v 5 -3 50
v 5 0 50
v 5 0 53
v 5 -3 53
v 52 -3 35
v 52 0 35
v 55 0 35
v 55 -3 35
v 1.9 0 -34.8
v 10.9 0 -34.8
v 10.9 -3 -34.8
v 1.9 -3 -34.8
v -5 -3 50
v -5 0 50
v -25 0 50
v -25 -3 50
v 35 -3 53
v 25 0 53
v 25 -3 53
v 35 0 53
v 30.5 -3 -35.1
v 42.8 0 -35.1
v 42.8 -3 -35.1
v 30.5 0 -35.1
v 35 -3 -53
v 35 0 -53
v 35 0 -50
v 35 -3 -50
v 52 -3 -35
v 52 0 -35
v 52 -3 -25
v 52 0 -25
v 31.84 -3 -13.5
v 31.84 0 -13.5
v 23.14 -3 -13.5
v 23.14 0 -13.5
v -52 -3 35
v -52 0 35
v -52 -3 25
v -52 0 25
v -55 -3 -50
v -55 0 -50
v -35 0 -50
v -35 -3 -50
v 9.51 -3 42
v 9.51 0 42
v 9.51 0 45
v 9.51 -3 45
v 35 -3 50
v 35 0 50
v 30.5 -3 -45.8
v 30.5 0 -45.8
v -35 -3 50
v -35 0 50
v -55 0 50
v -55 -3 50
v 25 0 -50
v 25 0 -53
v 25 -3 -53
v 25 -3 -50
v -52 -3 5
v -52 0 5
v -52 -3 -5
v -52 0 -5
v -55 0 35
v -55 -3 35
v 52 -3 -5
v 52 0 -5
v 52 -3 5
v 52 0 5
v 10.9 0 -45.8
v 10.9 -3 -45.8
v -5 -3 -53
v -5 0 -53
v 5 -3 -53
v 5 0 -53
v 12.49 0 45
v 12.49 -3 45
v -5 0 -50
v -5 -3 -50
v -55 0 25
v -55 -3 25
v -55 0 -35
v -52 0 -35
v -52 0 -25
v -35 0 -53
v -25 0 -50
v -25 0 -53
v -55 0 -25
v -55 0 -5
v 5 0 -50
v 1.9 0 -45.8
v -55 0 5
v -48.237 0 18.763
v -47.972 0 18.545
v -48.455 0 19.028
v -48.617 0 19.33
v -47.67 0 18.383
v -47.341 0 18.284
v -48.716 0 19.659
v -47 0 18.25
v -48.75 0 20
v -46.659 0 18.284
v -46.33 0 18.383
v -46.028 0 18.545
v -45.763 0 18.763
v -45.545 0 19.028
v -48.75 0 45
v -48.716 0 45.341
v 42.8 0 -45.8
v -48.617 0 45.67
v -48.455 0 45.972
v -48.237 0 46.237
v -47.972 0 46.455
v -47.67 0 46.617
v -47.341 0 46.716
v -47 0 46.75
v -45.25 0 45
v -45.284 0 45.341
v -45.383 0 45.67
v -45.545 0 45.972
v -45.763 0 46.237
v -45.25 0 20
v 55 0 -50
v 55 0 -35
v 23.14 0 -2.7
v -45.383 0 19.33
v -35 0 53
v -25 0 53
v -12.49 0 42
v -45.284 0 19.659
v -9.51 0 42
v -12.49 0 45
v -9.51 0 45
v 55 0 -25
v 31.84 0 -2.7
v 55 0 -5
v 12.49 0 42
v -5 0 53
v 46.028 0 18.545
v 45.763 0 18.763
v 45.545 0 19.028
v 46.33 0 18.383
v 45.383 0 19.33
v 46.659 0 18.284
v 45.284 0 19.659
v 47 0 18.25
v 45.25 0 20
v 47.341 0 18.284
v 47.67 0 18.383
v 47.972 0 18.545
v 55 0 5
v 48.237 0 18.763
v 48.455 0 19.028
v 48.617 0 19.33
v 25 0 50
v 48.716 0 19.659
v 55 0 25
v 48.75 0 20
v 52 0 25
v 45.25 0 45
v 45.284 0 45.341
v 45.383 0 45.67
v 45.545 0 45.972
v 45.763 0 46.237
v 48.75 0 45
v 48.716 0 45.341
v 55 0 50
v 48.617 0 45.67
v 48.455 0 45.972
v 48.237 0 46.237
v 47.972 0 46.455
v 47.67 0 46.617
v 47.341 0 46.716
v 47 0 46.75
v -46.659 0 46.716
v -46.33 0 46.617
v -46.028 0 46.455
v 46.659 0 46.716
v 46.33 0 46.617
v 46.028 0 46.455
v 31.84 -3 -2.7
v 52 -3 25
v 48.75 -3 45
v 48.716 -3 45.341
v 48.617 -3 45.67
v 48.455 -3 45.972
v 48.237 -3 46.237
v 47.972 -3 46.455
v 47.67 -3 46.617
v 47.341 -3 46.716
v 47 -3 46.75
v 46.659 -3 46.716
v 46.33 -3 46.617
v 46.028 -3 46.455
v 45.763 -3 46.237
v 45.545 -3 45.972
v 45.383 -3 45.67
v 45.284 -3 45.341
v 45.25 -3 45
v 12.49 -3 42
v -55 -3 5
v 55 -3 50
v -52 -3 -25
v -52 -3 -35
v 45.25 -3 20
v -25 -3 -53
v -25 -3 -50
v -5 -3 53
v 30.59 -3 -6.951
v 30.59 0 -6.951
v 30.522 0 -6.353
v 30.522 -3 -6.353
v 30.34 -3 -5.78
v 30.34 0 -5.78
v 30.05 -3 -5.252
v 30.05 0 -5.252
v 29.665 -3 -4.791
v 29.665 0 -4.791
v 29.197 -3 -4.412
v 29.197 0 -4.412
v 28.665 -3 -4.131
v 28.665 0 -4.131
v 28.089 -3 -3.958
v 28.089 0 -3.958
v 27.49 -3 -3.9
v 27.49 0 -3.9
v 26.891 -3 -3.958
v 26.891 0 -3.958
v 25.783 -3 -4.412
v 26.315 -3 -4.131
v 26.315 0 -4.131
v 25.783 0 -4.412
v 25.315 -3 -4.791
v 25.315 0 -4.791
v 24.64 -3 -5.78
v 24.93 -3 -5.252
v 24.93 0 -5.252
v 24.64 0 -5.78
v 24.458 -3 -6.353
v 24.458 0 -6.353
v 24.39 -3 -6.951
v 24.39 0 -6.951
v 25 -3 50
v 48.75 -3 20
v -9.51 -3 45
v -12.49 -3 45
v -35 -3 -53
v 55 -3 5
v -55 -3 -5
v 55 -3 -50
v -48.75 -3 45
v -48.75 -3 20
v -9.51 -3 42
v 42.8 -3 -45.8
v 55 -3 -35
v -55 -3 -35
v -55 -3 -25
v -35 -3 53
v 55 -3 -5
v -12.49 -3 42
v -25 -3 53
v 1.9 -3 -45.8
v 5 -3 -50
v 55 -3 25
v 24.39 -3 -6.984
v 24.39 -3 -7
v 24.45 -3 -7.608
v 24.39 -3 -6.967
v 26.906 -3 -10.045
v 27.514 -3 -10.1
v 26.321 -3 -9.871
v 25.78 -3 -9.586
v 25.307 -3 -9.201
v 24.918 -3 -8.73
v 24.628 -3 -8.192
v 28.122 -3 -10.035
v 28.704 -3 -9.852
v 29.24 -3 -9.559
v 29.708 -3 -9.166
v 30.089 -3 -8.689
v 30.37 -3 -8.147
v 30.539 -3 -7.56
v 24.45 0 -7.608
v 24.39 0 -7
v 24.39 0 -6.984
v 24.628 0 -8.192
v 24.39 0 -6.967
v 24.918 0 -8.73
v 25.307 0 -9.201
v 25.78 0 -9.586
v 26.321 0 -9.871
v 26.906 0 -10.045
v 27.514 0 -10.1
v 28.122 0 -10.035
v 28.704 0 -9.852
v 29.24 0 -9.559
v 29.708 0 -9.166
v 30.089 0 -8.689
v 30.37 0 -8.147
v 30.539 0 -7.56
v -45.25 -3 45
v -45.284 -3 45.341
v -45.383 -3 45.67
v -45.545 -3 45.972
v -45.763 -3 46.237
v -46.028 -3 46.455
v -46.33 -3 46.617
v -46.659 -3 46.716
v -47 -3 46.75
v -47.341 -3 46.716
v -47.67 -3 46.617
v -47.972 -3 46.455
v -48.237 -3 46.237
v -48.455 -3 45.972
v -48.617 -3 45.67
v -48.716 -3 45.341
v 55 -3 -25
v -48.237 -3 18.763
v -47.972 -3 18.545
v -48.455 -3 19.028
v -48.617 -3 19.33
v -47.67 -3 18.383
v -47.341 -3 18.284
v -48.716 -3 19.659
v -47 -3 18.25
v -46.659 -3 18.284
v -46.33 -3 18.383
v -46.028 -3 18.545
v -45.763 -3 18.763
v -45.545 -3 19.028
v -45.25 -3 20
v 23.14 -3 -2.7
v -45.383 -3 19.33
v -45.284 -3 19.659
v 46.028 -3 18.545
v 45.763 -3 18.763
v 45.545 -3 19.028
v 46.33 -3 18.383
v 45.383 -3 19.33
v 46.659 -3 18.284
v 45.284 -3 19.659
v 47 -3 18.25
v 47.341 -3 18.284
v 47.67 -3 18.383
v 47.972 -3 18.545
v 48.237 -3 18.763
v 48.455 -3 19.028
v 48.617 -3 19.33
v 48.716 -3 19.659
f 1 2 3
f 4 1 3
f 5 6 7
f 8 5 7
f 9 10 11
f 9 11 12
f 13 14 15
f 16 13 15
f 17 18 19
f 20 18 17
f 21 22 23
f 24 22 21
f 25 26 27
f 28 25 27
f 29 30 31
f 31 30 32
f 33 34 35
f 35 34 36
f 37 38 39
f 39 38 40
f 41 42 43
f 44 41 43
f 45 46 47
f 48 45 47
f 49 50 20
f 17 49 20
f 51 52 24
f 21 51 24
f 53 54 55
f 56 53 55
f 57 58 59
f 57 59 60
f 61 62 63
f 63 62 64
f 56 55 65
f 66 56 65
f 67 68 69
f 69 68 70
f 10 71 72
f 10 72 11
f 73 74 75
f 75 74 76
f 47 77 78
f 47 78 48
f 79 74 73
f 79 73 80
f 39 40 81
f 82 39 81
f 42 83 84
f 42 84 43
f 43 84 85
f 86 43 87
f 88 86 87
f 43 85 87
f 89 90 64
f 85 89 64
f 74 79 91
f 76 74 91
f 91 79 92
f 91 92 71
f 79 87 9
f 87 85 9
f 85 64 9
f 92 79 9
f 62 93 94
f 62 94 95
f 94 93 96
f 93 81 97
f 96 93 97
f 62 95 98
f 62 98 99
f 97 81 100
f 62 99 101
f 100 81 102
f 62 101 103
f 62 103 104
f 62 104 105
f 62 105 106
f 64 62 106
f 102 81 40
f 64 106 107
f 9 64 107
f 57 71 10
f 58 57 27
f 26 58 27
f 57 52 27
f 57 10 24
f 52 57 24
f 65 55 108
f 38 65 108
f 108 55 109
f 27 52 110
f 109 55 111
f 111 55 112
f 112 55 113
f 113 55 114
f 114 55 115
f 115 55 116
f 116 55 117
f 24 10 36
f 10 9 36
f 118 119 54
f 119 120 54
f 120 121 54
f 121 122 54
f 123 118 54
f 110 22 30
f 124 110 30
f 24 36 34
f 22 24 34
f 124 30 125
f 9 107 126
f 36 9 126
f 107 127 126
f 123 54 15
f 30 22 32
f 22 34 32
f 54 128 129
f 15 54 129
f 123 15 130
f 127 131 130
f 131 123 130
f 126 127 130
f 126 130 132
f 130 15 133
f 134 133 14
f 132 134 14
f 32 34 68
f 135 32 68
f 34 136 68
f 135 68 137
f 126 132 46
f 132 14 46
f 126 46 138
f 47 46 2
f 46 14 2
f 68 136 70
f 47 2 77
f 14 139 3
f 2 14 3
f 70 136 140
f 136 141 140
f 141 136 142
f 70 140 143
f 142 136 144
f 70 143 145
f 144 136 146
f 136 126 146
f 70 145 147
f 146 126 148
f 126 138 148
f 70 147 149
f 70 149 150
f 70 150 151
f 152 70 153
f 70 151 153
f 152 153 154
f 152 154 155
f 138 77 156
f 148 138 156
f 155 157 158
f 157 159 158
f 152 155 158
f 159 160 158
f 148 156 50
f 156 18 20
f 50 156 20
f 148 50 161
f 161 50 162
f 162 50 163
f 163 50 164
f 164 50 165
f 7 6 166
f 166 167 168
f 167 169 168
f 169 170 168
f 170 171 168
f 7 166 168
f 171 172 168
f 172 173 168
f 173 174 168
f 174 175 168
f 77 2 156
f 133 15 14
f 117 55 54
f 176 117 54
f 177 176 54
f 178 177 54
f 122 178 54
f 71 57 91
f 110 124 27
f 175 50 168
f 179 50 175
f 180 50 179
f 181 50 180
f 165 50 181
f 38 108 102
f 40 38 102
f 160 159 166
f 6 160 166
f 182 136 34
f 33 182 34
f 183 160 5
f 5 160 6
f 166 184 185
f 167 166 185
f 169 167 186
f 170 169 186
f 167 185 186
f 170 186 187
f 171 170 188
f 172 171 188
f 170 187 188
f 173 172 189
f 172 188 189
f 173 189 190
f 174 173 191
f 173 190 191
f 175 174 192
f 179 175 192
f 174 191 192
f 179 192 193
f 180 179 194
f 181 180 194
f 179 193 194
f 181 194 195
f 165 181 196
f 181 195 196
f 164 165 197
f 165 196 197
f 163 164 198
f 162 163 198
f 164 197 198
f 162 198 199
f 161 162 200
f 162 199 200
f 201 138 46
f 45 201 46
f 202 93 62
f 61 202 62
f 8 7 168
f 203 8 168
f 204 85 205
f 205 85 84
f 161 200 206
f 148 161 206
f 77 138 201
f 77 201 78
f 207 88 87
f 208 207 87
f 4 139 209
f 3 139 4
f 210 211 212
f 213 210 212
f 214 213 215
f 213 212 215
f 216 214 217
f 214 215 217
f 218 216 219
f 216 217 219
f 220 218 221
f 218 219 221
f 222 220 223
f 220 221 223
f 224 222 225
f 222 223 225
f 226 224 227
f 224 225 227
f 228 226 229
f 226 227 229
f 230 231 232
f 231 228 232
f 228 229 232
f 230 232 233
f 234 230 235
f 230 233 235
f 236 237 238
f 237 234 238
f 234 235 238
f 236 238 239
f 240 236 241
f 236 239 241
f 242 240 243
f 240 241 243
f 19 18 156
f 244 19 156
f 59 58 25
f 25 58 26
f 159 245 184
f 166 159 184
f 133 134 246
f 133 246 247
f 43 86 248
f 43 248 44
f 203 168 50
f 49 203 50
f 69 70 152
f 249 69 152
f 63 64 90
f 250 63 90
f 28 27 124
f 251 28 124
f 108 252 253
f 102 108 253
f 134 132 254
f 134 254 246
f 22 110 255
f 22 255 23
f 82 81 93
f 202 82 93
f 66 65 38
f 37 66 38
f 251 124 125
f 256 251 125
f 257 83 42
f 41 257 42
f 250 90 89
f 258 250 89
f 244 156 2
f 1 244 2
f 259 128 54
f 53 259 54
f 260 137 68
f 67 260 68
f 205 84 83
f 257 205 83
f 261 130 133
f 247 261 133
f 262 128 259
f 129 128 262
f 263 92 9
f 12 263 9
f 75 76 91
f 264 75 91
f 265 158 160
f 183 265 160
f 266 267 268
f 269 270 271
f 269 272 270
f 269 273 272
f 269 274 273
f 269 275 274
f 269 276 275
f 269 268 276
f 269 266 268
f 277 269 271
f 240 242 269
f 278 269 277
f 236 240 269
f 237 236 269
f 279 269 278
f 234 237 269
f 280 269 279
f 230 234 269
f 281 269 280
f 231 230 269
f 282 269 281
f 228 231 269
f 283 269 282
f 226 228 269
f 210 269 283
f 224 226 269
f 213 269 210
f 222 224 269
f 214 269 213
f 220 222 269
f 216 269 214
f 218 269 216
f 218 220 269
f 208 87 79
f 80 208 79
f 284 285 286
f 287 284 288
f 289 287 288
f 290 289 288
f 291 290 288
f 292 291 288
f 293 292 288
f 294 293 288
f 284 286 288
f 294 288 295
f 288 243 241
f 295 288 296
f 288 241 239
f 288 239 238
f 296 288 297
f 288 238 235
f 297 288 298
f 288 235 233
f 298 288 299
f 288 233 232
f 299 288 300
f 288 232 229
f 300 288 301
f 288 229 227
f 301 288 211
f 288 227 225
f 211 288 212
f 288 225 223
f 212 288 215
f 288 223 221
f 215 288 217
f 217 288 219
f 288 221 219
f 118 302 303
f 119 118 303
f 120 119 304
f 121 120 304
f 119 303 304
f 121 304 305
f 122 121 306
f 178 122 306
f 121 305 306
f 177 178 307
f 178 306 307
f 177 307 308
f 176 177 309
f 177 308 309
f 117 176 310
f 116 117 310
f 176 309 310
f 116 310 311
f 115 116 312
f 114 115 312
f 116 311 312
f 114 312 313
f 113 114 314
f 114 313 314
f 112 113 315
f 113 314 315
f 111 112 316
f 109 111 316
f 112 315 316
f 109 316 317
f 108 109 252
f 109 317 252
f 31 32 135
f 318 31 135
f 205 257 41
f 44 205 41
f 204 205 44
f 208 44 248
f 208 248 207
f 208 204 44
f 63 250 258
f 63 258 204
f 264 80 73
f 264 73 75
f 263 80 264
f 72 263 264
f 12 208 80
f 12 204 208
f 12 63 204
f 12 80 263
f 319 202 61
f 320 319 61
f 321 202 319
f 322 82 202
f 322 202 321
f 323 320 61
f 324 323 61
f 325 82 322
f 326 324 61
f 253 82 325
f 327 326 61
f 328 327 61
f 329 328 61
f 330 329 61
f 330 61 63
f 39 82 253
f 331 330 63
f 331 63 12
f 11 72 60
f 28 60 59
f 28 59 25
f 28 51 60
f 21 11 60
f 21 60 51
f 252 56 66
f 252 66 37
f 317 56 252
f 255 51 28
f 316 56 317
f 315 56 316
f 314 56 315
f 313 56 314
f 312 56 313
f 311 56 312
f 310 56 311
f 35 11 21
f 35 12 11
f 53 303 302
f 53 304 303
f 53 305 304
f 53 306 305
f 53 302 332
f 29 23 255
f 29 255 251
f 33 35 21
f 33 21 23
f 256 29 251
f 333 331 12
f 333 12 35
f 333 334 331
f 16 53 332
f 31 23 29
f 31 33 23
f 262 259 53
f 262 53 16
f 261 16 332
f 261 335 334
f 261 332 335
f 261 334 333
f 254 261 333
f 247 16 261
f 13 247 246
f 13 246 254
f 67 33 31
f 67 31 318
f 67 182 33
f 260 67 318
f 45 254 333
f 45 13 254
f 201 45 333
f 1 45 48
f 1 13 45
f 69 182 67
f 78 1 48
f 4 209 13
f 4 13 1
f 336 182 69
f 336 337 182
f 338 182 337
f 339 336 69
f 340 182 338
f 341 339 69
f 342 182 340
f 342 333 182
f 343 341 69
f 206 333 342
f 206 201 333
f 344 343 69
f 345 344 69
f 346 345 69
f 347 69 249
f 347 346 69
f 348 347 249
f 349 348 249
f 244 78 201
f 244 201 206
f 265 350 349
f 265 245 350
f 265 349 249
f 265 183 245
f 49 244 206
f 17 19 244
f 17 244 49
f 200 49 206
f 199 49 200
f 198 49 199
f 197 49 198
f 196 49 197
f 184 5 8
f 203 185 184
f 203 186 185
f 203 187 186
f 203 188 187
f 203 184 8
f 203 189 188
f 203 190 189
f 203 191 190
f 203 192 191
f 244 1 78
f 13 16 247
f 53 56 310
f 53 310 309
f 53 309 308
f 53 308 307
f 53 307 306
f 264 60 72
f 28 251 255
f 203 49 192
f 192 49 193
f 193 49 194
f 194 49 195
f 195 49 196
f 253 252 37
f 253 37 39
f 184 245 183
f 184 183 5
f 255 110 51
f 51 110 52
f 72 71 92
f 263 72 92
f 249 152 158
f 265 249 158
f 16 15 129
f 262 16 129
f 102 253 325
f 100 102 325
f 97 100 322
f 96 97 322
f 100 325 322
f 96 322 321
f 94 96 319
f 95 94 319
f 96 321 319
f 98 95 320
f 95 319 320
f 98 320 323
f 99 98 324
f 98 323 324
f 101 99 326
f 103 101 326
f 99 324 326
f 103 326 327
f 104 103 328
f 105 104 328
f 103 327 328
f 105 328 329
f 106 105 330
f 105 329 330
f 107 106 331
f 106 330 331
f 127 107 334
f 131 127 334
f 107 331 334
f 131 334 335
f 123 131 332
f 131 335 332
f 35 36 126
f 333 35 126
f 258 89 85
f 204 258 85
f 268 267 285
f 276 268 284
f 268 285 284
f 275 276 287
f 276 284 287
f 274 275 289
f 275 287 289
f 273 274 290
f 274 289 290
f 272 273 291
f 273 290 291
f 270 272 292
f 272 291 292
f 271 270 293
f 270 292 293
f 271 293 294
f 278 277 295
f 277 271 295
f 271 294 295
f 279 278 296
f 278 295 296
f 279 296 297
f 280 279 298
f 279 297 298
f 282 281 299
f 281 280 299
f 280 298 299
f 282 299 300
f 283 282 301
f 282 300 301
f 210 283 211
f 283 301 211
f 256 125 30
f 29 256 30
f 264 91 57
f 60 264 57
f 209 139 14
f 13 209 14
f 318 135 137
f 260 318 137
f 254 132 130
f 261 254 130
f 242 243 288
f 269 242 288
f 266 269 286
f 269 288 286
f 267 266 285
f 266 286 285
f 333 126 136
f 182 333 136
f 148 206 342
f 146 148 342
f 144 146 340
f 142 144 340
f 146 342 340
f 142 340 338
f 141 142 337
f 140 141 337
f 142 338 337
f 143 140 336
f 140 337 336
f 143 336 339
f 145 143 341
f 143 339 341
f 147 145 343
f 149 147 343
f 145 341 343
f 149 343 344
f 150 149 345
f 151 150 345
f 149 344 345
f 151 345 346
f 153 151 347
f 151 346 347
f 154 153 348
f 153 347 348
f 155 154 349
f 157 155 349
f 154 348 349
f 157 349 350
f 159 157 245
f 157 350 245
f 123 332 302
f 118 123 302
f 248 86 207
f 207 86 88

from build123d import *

# Parameters (mm, degrees)
F0_W     = 10
F0_H     = 3
F1_DEPTH = 3
F2_W     = 2.98
F2_H     = 3
F2_W_2   = 12.3
F2_H_2   = 10.7
F2_W_3   = 9
F2_H_3   = 11
F2_W_4   = 8.7
F2_H_4   = 2.2
F3_DEPTH = 25
F5_DEPTH = 25


# Not quite as in the source:
# - a feature names something its author has since deleted; it is built from what else it names


with BuildPart() as f1:
    # F0 (on Front) → F1 (new body)
    with BuildSketch(Plane.XZ):
        with Locations((30, 51.5)):
            Rectangle(F0_W, F0_H)
        with Locations((0, 51.5)):
            Rectangle(F0_W, F0_H)
        with Locations((-30, 51.5)):
            Rectangle(F0_W, F0_H)
        with Locations((30, 48.5)):
            Rectangle(F0_W, F0_H)
        with Locations((0, 48.5)):
            Rectangle(F0_W, F0_H)
        with Locations((-30, 48.5)):
            Rectangle(F0_W, F0_H)
        Polygon((55, 35), (55, 50), (35, 50), (35, 47), (25, 47), (25, 50), (5, 50), (5, 47), (-5, 47), (-5, 50), (-25, 50), (-25, 47), (-35, 47), (-35, 50), (-55, 50), (-55, 35), (-52, 35), (-52, 25), (-55, 25), (-55, 5), (-52, 5), (-52, -5), (-55, -5), (-55, -25), (-52, -25), (-52, -35), (-55, -35), (-55, -50), (-35, -50), (-35, -47), (-25, -47), (-25, -50), (-5, -50), (-5, -47), (5, -47), (5, -50), (25, -50), (25, -47), (35, -47), (35, -50), (55, -50), (55, -35), (52, -35), (52, -25), (55, -25), (55, -5), (52, -5), (52, 5), (55, 5), (55, 25), (52, 25), (52, 35), align=None)
        with Locations((30, -51.5)):
            Rectangle(F0_W, F0_H)
        with Locations((30, -48.5)):
            Rectangle(F0_W, F0_H)
        with Locations((0, -48.5)):
            Rectangle(F0_W, F0_H)
        with Locations((0, -51.5)):
            Rectangle(F0_W, F0_H)
        with Locations((-30, -48.5)):
            Rectangle(F0_W, F0_H)
        with Locations((-30, -51.5)):
            Rectangle(F0_W, F0_H)
    extrude(amount=F1_DEPTH)

    # F2 (on face) + F1_face1 (on face) → F3 (cut)
    with BuildSketch(Plane(origin=(0, 0, 0), x_dir=(-1, 0, 0), z_dir=(0, 1, 0))):
        with Locations((-11, 43.5)):
            Rectangle(F2_W, F2_H)
        with Locations((-36.65, -40.45)):
            Rectangle(F2_W_2, F2_H_2)
        with Locations((-6.4, -40.3)):
            Rectangle(F2_W_3, F2_H_3)
        with Locations((11, 43.5)):
            Rectangle(F2_W, F2_H)
        with BuildLine():
            ThreePointArc((-24.3903848411, -6.9511546684), (-24.3900962118, -6.9755765762), (-24.39, -7))
            ThreePointArc((-24.39, -7), (-27.5144234238, -10.0999037882), (-30.5896151589, -6.9511546684))
            Line((-30.5896151589, -6.9511546684), (-31.84, -6.9511546684))
            Line((-31.84, -6.9511546684), (-31.84, -11.3))
            Line((-31.84, -11.3), (-23.14, -11.3))
            Line((-23.14, -11.3), (-23.14, -6.9511546684))
            Line((-23.14, -6.9511546684), (-24.3903848411, -6.9511546684))
        make_face()
        with BuildLine():
            ThreePointArc((-30.5896151589, -6.9511546684), (-27.49, -3.9), (-24.3903848411, -6.9511546684))
            Line((-24.3903848411, -6.9511546684), (-23.14, -6.9511546684))
            Line((-23.14, -6.9511546684), (-23.14, -2.7))
            Line((-23.14, -2.7), (-31.84, -2.7))
            Line((-31.84, -2.7), (-31.84, -6.9511546684))
            Line((-31.84, -6.9511546684), (-30.5896151589, -6.9511546684))
        make_face()
        with Locations((-27.49, -12.4)):
            Rectangle(F2_W_4, F2_H_4)
    with BuildSketch(Plane.XZ.offset(3)):
        Polygon((35, 53), (25, 53), (25, 50), (5, 50), (5, 53), (-5, 53), (-5, 50), (-25, 50), (-25, 53), (-35, 53), (-35, 50), (-55, 50), (-55, 35), (-52, 35), (-52, 25), (-55, 25), (-55, 5), (-52, 5), (-52, -5), (-55, -5), (-55, -25), (-52, -25), (-52, -35), (-55, -35), (-55, -50), (-35, -50), (-35, -53), (-25, -53), (-25, -50), (-5, -50), (-5, -53), (5, -53), (5, -50), (25, -50), (25, -53), (35, -53), (35, -50), (55, -50), (55, -35), (52, -35), (52, -25), (55, -25), (55, -5), (52, -5), (52, 5), (55, 5), (55, 25), (52, 25), (52, 35), (55, 35), (55, 50), (35, 50), align=None)
    extrude(amount=-F3_DEPTH, dir=(0, 1, 0), mode=Mode.SUBTRACT)

    # F4 (on face) → F5 (cut)
    with BuildSketch(Plane.XZ.offset(3)):
        with BuildLine():
            ThreePointArc((-45.25, 45), (-47, 46.75), (-48.75, 45))
            Line((-48.75, 45), (-48.75, 20))
            ThreePointArc((-48.75, 20), (-47, 18.25), (-45.25, 20))
            Line((-45.25, 20), (-45.25, 45))
        make_face()
        with BuildLine():
            ThreePointArc((48.75, 45), (47, 46.75), (45.25, 45))
            Line((45.25, 45), (45.25, 20))
            ThreePointArc((45.25, 20), (47, 18.25), (48.75, 20))
            Line((48.75, 20), (48.75, 45))
        make_face()
    extrude(amount=-F5_DEPTH, mode=Mode.SUBTRACT)


solid = f1.part
